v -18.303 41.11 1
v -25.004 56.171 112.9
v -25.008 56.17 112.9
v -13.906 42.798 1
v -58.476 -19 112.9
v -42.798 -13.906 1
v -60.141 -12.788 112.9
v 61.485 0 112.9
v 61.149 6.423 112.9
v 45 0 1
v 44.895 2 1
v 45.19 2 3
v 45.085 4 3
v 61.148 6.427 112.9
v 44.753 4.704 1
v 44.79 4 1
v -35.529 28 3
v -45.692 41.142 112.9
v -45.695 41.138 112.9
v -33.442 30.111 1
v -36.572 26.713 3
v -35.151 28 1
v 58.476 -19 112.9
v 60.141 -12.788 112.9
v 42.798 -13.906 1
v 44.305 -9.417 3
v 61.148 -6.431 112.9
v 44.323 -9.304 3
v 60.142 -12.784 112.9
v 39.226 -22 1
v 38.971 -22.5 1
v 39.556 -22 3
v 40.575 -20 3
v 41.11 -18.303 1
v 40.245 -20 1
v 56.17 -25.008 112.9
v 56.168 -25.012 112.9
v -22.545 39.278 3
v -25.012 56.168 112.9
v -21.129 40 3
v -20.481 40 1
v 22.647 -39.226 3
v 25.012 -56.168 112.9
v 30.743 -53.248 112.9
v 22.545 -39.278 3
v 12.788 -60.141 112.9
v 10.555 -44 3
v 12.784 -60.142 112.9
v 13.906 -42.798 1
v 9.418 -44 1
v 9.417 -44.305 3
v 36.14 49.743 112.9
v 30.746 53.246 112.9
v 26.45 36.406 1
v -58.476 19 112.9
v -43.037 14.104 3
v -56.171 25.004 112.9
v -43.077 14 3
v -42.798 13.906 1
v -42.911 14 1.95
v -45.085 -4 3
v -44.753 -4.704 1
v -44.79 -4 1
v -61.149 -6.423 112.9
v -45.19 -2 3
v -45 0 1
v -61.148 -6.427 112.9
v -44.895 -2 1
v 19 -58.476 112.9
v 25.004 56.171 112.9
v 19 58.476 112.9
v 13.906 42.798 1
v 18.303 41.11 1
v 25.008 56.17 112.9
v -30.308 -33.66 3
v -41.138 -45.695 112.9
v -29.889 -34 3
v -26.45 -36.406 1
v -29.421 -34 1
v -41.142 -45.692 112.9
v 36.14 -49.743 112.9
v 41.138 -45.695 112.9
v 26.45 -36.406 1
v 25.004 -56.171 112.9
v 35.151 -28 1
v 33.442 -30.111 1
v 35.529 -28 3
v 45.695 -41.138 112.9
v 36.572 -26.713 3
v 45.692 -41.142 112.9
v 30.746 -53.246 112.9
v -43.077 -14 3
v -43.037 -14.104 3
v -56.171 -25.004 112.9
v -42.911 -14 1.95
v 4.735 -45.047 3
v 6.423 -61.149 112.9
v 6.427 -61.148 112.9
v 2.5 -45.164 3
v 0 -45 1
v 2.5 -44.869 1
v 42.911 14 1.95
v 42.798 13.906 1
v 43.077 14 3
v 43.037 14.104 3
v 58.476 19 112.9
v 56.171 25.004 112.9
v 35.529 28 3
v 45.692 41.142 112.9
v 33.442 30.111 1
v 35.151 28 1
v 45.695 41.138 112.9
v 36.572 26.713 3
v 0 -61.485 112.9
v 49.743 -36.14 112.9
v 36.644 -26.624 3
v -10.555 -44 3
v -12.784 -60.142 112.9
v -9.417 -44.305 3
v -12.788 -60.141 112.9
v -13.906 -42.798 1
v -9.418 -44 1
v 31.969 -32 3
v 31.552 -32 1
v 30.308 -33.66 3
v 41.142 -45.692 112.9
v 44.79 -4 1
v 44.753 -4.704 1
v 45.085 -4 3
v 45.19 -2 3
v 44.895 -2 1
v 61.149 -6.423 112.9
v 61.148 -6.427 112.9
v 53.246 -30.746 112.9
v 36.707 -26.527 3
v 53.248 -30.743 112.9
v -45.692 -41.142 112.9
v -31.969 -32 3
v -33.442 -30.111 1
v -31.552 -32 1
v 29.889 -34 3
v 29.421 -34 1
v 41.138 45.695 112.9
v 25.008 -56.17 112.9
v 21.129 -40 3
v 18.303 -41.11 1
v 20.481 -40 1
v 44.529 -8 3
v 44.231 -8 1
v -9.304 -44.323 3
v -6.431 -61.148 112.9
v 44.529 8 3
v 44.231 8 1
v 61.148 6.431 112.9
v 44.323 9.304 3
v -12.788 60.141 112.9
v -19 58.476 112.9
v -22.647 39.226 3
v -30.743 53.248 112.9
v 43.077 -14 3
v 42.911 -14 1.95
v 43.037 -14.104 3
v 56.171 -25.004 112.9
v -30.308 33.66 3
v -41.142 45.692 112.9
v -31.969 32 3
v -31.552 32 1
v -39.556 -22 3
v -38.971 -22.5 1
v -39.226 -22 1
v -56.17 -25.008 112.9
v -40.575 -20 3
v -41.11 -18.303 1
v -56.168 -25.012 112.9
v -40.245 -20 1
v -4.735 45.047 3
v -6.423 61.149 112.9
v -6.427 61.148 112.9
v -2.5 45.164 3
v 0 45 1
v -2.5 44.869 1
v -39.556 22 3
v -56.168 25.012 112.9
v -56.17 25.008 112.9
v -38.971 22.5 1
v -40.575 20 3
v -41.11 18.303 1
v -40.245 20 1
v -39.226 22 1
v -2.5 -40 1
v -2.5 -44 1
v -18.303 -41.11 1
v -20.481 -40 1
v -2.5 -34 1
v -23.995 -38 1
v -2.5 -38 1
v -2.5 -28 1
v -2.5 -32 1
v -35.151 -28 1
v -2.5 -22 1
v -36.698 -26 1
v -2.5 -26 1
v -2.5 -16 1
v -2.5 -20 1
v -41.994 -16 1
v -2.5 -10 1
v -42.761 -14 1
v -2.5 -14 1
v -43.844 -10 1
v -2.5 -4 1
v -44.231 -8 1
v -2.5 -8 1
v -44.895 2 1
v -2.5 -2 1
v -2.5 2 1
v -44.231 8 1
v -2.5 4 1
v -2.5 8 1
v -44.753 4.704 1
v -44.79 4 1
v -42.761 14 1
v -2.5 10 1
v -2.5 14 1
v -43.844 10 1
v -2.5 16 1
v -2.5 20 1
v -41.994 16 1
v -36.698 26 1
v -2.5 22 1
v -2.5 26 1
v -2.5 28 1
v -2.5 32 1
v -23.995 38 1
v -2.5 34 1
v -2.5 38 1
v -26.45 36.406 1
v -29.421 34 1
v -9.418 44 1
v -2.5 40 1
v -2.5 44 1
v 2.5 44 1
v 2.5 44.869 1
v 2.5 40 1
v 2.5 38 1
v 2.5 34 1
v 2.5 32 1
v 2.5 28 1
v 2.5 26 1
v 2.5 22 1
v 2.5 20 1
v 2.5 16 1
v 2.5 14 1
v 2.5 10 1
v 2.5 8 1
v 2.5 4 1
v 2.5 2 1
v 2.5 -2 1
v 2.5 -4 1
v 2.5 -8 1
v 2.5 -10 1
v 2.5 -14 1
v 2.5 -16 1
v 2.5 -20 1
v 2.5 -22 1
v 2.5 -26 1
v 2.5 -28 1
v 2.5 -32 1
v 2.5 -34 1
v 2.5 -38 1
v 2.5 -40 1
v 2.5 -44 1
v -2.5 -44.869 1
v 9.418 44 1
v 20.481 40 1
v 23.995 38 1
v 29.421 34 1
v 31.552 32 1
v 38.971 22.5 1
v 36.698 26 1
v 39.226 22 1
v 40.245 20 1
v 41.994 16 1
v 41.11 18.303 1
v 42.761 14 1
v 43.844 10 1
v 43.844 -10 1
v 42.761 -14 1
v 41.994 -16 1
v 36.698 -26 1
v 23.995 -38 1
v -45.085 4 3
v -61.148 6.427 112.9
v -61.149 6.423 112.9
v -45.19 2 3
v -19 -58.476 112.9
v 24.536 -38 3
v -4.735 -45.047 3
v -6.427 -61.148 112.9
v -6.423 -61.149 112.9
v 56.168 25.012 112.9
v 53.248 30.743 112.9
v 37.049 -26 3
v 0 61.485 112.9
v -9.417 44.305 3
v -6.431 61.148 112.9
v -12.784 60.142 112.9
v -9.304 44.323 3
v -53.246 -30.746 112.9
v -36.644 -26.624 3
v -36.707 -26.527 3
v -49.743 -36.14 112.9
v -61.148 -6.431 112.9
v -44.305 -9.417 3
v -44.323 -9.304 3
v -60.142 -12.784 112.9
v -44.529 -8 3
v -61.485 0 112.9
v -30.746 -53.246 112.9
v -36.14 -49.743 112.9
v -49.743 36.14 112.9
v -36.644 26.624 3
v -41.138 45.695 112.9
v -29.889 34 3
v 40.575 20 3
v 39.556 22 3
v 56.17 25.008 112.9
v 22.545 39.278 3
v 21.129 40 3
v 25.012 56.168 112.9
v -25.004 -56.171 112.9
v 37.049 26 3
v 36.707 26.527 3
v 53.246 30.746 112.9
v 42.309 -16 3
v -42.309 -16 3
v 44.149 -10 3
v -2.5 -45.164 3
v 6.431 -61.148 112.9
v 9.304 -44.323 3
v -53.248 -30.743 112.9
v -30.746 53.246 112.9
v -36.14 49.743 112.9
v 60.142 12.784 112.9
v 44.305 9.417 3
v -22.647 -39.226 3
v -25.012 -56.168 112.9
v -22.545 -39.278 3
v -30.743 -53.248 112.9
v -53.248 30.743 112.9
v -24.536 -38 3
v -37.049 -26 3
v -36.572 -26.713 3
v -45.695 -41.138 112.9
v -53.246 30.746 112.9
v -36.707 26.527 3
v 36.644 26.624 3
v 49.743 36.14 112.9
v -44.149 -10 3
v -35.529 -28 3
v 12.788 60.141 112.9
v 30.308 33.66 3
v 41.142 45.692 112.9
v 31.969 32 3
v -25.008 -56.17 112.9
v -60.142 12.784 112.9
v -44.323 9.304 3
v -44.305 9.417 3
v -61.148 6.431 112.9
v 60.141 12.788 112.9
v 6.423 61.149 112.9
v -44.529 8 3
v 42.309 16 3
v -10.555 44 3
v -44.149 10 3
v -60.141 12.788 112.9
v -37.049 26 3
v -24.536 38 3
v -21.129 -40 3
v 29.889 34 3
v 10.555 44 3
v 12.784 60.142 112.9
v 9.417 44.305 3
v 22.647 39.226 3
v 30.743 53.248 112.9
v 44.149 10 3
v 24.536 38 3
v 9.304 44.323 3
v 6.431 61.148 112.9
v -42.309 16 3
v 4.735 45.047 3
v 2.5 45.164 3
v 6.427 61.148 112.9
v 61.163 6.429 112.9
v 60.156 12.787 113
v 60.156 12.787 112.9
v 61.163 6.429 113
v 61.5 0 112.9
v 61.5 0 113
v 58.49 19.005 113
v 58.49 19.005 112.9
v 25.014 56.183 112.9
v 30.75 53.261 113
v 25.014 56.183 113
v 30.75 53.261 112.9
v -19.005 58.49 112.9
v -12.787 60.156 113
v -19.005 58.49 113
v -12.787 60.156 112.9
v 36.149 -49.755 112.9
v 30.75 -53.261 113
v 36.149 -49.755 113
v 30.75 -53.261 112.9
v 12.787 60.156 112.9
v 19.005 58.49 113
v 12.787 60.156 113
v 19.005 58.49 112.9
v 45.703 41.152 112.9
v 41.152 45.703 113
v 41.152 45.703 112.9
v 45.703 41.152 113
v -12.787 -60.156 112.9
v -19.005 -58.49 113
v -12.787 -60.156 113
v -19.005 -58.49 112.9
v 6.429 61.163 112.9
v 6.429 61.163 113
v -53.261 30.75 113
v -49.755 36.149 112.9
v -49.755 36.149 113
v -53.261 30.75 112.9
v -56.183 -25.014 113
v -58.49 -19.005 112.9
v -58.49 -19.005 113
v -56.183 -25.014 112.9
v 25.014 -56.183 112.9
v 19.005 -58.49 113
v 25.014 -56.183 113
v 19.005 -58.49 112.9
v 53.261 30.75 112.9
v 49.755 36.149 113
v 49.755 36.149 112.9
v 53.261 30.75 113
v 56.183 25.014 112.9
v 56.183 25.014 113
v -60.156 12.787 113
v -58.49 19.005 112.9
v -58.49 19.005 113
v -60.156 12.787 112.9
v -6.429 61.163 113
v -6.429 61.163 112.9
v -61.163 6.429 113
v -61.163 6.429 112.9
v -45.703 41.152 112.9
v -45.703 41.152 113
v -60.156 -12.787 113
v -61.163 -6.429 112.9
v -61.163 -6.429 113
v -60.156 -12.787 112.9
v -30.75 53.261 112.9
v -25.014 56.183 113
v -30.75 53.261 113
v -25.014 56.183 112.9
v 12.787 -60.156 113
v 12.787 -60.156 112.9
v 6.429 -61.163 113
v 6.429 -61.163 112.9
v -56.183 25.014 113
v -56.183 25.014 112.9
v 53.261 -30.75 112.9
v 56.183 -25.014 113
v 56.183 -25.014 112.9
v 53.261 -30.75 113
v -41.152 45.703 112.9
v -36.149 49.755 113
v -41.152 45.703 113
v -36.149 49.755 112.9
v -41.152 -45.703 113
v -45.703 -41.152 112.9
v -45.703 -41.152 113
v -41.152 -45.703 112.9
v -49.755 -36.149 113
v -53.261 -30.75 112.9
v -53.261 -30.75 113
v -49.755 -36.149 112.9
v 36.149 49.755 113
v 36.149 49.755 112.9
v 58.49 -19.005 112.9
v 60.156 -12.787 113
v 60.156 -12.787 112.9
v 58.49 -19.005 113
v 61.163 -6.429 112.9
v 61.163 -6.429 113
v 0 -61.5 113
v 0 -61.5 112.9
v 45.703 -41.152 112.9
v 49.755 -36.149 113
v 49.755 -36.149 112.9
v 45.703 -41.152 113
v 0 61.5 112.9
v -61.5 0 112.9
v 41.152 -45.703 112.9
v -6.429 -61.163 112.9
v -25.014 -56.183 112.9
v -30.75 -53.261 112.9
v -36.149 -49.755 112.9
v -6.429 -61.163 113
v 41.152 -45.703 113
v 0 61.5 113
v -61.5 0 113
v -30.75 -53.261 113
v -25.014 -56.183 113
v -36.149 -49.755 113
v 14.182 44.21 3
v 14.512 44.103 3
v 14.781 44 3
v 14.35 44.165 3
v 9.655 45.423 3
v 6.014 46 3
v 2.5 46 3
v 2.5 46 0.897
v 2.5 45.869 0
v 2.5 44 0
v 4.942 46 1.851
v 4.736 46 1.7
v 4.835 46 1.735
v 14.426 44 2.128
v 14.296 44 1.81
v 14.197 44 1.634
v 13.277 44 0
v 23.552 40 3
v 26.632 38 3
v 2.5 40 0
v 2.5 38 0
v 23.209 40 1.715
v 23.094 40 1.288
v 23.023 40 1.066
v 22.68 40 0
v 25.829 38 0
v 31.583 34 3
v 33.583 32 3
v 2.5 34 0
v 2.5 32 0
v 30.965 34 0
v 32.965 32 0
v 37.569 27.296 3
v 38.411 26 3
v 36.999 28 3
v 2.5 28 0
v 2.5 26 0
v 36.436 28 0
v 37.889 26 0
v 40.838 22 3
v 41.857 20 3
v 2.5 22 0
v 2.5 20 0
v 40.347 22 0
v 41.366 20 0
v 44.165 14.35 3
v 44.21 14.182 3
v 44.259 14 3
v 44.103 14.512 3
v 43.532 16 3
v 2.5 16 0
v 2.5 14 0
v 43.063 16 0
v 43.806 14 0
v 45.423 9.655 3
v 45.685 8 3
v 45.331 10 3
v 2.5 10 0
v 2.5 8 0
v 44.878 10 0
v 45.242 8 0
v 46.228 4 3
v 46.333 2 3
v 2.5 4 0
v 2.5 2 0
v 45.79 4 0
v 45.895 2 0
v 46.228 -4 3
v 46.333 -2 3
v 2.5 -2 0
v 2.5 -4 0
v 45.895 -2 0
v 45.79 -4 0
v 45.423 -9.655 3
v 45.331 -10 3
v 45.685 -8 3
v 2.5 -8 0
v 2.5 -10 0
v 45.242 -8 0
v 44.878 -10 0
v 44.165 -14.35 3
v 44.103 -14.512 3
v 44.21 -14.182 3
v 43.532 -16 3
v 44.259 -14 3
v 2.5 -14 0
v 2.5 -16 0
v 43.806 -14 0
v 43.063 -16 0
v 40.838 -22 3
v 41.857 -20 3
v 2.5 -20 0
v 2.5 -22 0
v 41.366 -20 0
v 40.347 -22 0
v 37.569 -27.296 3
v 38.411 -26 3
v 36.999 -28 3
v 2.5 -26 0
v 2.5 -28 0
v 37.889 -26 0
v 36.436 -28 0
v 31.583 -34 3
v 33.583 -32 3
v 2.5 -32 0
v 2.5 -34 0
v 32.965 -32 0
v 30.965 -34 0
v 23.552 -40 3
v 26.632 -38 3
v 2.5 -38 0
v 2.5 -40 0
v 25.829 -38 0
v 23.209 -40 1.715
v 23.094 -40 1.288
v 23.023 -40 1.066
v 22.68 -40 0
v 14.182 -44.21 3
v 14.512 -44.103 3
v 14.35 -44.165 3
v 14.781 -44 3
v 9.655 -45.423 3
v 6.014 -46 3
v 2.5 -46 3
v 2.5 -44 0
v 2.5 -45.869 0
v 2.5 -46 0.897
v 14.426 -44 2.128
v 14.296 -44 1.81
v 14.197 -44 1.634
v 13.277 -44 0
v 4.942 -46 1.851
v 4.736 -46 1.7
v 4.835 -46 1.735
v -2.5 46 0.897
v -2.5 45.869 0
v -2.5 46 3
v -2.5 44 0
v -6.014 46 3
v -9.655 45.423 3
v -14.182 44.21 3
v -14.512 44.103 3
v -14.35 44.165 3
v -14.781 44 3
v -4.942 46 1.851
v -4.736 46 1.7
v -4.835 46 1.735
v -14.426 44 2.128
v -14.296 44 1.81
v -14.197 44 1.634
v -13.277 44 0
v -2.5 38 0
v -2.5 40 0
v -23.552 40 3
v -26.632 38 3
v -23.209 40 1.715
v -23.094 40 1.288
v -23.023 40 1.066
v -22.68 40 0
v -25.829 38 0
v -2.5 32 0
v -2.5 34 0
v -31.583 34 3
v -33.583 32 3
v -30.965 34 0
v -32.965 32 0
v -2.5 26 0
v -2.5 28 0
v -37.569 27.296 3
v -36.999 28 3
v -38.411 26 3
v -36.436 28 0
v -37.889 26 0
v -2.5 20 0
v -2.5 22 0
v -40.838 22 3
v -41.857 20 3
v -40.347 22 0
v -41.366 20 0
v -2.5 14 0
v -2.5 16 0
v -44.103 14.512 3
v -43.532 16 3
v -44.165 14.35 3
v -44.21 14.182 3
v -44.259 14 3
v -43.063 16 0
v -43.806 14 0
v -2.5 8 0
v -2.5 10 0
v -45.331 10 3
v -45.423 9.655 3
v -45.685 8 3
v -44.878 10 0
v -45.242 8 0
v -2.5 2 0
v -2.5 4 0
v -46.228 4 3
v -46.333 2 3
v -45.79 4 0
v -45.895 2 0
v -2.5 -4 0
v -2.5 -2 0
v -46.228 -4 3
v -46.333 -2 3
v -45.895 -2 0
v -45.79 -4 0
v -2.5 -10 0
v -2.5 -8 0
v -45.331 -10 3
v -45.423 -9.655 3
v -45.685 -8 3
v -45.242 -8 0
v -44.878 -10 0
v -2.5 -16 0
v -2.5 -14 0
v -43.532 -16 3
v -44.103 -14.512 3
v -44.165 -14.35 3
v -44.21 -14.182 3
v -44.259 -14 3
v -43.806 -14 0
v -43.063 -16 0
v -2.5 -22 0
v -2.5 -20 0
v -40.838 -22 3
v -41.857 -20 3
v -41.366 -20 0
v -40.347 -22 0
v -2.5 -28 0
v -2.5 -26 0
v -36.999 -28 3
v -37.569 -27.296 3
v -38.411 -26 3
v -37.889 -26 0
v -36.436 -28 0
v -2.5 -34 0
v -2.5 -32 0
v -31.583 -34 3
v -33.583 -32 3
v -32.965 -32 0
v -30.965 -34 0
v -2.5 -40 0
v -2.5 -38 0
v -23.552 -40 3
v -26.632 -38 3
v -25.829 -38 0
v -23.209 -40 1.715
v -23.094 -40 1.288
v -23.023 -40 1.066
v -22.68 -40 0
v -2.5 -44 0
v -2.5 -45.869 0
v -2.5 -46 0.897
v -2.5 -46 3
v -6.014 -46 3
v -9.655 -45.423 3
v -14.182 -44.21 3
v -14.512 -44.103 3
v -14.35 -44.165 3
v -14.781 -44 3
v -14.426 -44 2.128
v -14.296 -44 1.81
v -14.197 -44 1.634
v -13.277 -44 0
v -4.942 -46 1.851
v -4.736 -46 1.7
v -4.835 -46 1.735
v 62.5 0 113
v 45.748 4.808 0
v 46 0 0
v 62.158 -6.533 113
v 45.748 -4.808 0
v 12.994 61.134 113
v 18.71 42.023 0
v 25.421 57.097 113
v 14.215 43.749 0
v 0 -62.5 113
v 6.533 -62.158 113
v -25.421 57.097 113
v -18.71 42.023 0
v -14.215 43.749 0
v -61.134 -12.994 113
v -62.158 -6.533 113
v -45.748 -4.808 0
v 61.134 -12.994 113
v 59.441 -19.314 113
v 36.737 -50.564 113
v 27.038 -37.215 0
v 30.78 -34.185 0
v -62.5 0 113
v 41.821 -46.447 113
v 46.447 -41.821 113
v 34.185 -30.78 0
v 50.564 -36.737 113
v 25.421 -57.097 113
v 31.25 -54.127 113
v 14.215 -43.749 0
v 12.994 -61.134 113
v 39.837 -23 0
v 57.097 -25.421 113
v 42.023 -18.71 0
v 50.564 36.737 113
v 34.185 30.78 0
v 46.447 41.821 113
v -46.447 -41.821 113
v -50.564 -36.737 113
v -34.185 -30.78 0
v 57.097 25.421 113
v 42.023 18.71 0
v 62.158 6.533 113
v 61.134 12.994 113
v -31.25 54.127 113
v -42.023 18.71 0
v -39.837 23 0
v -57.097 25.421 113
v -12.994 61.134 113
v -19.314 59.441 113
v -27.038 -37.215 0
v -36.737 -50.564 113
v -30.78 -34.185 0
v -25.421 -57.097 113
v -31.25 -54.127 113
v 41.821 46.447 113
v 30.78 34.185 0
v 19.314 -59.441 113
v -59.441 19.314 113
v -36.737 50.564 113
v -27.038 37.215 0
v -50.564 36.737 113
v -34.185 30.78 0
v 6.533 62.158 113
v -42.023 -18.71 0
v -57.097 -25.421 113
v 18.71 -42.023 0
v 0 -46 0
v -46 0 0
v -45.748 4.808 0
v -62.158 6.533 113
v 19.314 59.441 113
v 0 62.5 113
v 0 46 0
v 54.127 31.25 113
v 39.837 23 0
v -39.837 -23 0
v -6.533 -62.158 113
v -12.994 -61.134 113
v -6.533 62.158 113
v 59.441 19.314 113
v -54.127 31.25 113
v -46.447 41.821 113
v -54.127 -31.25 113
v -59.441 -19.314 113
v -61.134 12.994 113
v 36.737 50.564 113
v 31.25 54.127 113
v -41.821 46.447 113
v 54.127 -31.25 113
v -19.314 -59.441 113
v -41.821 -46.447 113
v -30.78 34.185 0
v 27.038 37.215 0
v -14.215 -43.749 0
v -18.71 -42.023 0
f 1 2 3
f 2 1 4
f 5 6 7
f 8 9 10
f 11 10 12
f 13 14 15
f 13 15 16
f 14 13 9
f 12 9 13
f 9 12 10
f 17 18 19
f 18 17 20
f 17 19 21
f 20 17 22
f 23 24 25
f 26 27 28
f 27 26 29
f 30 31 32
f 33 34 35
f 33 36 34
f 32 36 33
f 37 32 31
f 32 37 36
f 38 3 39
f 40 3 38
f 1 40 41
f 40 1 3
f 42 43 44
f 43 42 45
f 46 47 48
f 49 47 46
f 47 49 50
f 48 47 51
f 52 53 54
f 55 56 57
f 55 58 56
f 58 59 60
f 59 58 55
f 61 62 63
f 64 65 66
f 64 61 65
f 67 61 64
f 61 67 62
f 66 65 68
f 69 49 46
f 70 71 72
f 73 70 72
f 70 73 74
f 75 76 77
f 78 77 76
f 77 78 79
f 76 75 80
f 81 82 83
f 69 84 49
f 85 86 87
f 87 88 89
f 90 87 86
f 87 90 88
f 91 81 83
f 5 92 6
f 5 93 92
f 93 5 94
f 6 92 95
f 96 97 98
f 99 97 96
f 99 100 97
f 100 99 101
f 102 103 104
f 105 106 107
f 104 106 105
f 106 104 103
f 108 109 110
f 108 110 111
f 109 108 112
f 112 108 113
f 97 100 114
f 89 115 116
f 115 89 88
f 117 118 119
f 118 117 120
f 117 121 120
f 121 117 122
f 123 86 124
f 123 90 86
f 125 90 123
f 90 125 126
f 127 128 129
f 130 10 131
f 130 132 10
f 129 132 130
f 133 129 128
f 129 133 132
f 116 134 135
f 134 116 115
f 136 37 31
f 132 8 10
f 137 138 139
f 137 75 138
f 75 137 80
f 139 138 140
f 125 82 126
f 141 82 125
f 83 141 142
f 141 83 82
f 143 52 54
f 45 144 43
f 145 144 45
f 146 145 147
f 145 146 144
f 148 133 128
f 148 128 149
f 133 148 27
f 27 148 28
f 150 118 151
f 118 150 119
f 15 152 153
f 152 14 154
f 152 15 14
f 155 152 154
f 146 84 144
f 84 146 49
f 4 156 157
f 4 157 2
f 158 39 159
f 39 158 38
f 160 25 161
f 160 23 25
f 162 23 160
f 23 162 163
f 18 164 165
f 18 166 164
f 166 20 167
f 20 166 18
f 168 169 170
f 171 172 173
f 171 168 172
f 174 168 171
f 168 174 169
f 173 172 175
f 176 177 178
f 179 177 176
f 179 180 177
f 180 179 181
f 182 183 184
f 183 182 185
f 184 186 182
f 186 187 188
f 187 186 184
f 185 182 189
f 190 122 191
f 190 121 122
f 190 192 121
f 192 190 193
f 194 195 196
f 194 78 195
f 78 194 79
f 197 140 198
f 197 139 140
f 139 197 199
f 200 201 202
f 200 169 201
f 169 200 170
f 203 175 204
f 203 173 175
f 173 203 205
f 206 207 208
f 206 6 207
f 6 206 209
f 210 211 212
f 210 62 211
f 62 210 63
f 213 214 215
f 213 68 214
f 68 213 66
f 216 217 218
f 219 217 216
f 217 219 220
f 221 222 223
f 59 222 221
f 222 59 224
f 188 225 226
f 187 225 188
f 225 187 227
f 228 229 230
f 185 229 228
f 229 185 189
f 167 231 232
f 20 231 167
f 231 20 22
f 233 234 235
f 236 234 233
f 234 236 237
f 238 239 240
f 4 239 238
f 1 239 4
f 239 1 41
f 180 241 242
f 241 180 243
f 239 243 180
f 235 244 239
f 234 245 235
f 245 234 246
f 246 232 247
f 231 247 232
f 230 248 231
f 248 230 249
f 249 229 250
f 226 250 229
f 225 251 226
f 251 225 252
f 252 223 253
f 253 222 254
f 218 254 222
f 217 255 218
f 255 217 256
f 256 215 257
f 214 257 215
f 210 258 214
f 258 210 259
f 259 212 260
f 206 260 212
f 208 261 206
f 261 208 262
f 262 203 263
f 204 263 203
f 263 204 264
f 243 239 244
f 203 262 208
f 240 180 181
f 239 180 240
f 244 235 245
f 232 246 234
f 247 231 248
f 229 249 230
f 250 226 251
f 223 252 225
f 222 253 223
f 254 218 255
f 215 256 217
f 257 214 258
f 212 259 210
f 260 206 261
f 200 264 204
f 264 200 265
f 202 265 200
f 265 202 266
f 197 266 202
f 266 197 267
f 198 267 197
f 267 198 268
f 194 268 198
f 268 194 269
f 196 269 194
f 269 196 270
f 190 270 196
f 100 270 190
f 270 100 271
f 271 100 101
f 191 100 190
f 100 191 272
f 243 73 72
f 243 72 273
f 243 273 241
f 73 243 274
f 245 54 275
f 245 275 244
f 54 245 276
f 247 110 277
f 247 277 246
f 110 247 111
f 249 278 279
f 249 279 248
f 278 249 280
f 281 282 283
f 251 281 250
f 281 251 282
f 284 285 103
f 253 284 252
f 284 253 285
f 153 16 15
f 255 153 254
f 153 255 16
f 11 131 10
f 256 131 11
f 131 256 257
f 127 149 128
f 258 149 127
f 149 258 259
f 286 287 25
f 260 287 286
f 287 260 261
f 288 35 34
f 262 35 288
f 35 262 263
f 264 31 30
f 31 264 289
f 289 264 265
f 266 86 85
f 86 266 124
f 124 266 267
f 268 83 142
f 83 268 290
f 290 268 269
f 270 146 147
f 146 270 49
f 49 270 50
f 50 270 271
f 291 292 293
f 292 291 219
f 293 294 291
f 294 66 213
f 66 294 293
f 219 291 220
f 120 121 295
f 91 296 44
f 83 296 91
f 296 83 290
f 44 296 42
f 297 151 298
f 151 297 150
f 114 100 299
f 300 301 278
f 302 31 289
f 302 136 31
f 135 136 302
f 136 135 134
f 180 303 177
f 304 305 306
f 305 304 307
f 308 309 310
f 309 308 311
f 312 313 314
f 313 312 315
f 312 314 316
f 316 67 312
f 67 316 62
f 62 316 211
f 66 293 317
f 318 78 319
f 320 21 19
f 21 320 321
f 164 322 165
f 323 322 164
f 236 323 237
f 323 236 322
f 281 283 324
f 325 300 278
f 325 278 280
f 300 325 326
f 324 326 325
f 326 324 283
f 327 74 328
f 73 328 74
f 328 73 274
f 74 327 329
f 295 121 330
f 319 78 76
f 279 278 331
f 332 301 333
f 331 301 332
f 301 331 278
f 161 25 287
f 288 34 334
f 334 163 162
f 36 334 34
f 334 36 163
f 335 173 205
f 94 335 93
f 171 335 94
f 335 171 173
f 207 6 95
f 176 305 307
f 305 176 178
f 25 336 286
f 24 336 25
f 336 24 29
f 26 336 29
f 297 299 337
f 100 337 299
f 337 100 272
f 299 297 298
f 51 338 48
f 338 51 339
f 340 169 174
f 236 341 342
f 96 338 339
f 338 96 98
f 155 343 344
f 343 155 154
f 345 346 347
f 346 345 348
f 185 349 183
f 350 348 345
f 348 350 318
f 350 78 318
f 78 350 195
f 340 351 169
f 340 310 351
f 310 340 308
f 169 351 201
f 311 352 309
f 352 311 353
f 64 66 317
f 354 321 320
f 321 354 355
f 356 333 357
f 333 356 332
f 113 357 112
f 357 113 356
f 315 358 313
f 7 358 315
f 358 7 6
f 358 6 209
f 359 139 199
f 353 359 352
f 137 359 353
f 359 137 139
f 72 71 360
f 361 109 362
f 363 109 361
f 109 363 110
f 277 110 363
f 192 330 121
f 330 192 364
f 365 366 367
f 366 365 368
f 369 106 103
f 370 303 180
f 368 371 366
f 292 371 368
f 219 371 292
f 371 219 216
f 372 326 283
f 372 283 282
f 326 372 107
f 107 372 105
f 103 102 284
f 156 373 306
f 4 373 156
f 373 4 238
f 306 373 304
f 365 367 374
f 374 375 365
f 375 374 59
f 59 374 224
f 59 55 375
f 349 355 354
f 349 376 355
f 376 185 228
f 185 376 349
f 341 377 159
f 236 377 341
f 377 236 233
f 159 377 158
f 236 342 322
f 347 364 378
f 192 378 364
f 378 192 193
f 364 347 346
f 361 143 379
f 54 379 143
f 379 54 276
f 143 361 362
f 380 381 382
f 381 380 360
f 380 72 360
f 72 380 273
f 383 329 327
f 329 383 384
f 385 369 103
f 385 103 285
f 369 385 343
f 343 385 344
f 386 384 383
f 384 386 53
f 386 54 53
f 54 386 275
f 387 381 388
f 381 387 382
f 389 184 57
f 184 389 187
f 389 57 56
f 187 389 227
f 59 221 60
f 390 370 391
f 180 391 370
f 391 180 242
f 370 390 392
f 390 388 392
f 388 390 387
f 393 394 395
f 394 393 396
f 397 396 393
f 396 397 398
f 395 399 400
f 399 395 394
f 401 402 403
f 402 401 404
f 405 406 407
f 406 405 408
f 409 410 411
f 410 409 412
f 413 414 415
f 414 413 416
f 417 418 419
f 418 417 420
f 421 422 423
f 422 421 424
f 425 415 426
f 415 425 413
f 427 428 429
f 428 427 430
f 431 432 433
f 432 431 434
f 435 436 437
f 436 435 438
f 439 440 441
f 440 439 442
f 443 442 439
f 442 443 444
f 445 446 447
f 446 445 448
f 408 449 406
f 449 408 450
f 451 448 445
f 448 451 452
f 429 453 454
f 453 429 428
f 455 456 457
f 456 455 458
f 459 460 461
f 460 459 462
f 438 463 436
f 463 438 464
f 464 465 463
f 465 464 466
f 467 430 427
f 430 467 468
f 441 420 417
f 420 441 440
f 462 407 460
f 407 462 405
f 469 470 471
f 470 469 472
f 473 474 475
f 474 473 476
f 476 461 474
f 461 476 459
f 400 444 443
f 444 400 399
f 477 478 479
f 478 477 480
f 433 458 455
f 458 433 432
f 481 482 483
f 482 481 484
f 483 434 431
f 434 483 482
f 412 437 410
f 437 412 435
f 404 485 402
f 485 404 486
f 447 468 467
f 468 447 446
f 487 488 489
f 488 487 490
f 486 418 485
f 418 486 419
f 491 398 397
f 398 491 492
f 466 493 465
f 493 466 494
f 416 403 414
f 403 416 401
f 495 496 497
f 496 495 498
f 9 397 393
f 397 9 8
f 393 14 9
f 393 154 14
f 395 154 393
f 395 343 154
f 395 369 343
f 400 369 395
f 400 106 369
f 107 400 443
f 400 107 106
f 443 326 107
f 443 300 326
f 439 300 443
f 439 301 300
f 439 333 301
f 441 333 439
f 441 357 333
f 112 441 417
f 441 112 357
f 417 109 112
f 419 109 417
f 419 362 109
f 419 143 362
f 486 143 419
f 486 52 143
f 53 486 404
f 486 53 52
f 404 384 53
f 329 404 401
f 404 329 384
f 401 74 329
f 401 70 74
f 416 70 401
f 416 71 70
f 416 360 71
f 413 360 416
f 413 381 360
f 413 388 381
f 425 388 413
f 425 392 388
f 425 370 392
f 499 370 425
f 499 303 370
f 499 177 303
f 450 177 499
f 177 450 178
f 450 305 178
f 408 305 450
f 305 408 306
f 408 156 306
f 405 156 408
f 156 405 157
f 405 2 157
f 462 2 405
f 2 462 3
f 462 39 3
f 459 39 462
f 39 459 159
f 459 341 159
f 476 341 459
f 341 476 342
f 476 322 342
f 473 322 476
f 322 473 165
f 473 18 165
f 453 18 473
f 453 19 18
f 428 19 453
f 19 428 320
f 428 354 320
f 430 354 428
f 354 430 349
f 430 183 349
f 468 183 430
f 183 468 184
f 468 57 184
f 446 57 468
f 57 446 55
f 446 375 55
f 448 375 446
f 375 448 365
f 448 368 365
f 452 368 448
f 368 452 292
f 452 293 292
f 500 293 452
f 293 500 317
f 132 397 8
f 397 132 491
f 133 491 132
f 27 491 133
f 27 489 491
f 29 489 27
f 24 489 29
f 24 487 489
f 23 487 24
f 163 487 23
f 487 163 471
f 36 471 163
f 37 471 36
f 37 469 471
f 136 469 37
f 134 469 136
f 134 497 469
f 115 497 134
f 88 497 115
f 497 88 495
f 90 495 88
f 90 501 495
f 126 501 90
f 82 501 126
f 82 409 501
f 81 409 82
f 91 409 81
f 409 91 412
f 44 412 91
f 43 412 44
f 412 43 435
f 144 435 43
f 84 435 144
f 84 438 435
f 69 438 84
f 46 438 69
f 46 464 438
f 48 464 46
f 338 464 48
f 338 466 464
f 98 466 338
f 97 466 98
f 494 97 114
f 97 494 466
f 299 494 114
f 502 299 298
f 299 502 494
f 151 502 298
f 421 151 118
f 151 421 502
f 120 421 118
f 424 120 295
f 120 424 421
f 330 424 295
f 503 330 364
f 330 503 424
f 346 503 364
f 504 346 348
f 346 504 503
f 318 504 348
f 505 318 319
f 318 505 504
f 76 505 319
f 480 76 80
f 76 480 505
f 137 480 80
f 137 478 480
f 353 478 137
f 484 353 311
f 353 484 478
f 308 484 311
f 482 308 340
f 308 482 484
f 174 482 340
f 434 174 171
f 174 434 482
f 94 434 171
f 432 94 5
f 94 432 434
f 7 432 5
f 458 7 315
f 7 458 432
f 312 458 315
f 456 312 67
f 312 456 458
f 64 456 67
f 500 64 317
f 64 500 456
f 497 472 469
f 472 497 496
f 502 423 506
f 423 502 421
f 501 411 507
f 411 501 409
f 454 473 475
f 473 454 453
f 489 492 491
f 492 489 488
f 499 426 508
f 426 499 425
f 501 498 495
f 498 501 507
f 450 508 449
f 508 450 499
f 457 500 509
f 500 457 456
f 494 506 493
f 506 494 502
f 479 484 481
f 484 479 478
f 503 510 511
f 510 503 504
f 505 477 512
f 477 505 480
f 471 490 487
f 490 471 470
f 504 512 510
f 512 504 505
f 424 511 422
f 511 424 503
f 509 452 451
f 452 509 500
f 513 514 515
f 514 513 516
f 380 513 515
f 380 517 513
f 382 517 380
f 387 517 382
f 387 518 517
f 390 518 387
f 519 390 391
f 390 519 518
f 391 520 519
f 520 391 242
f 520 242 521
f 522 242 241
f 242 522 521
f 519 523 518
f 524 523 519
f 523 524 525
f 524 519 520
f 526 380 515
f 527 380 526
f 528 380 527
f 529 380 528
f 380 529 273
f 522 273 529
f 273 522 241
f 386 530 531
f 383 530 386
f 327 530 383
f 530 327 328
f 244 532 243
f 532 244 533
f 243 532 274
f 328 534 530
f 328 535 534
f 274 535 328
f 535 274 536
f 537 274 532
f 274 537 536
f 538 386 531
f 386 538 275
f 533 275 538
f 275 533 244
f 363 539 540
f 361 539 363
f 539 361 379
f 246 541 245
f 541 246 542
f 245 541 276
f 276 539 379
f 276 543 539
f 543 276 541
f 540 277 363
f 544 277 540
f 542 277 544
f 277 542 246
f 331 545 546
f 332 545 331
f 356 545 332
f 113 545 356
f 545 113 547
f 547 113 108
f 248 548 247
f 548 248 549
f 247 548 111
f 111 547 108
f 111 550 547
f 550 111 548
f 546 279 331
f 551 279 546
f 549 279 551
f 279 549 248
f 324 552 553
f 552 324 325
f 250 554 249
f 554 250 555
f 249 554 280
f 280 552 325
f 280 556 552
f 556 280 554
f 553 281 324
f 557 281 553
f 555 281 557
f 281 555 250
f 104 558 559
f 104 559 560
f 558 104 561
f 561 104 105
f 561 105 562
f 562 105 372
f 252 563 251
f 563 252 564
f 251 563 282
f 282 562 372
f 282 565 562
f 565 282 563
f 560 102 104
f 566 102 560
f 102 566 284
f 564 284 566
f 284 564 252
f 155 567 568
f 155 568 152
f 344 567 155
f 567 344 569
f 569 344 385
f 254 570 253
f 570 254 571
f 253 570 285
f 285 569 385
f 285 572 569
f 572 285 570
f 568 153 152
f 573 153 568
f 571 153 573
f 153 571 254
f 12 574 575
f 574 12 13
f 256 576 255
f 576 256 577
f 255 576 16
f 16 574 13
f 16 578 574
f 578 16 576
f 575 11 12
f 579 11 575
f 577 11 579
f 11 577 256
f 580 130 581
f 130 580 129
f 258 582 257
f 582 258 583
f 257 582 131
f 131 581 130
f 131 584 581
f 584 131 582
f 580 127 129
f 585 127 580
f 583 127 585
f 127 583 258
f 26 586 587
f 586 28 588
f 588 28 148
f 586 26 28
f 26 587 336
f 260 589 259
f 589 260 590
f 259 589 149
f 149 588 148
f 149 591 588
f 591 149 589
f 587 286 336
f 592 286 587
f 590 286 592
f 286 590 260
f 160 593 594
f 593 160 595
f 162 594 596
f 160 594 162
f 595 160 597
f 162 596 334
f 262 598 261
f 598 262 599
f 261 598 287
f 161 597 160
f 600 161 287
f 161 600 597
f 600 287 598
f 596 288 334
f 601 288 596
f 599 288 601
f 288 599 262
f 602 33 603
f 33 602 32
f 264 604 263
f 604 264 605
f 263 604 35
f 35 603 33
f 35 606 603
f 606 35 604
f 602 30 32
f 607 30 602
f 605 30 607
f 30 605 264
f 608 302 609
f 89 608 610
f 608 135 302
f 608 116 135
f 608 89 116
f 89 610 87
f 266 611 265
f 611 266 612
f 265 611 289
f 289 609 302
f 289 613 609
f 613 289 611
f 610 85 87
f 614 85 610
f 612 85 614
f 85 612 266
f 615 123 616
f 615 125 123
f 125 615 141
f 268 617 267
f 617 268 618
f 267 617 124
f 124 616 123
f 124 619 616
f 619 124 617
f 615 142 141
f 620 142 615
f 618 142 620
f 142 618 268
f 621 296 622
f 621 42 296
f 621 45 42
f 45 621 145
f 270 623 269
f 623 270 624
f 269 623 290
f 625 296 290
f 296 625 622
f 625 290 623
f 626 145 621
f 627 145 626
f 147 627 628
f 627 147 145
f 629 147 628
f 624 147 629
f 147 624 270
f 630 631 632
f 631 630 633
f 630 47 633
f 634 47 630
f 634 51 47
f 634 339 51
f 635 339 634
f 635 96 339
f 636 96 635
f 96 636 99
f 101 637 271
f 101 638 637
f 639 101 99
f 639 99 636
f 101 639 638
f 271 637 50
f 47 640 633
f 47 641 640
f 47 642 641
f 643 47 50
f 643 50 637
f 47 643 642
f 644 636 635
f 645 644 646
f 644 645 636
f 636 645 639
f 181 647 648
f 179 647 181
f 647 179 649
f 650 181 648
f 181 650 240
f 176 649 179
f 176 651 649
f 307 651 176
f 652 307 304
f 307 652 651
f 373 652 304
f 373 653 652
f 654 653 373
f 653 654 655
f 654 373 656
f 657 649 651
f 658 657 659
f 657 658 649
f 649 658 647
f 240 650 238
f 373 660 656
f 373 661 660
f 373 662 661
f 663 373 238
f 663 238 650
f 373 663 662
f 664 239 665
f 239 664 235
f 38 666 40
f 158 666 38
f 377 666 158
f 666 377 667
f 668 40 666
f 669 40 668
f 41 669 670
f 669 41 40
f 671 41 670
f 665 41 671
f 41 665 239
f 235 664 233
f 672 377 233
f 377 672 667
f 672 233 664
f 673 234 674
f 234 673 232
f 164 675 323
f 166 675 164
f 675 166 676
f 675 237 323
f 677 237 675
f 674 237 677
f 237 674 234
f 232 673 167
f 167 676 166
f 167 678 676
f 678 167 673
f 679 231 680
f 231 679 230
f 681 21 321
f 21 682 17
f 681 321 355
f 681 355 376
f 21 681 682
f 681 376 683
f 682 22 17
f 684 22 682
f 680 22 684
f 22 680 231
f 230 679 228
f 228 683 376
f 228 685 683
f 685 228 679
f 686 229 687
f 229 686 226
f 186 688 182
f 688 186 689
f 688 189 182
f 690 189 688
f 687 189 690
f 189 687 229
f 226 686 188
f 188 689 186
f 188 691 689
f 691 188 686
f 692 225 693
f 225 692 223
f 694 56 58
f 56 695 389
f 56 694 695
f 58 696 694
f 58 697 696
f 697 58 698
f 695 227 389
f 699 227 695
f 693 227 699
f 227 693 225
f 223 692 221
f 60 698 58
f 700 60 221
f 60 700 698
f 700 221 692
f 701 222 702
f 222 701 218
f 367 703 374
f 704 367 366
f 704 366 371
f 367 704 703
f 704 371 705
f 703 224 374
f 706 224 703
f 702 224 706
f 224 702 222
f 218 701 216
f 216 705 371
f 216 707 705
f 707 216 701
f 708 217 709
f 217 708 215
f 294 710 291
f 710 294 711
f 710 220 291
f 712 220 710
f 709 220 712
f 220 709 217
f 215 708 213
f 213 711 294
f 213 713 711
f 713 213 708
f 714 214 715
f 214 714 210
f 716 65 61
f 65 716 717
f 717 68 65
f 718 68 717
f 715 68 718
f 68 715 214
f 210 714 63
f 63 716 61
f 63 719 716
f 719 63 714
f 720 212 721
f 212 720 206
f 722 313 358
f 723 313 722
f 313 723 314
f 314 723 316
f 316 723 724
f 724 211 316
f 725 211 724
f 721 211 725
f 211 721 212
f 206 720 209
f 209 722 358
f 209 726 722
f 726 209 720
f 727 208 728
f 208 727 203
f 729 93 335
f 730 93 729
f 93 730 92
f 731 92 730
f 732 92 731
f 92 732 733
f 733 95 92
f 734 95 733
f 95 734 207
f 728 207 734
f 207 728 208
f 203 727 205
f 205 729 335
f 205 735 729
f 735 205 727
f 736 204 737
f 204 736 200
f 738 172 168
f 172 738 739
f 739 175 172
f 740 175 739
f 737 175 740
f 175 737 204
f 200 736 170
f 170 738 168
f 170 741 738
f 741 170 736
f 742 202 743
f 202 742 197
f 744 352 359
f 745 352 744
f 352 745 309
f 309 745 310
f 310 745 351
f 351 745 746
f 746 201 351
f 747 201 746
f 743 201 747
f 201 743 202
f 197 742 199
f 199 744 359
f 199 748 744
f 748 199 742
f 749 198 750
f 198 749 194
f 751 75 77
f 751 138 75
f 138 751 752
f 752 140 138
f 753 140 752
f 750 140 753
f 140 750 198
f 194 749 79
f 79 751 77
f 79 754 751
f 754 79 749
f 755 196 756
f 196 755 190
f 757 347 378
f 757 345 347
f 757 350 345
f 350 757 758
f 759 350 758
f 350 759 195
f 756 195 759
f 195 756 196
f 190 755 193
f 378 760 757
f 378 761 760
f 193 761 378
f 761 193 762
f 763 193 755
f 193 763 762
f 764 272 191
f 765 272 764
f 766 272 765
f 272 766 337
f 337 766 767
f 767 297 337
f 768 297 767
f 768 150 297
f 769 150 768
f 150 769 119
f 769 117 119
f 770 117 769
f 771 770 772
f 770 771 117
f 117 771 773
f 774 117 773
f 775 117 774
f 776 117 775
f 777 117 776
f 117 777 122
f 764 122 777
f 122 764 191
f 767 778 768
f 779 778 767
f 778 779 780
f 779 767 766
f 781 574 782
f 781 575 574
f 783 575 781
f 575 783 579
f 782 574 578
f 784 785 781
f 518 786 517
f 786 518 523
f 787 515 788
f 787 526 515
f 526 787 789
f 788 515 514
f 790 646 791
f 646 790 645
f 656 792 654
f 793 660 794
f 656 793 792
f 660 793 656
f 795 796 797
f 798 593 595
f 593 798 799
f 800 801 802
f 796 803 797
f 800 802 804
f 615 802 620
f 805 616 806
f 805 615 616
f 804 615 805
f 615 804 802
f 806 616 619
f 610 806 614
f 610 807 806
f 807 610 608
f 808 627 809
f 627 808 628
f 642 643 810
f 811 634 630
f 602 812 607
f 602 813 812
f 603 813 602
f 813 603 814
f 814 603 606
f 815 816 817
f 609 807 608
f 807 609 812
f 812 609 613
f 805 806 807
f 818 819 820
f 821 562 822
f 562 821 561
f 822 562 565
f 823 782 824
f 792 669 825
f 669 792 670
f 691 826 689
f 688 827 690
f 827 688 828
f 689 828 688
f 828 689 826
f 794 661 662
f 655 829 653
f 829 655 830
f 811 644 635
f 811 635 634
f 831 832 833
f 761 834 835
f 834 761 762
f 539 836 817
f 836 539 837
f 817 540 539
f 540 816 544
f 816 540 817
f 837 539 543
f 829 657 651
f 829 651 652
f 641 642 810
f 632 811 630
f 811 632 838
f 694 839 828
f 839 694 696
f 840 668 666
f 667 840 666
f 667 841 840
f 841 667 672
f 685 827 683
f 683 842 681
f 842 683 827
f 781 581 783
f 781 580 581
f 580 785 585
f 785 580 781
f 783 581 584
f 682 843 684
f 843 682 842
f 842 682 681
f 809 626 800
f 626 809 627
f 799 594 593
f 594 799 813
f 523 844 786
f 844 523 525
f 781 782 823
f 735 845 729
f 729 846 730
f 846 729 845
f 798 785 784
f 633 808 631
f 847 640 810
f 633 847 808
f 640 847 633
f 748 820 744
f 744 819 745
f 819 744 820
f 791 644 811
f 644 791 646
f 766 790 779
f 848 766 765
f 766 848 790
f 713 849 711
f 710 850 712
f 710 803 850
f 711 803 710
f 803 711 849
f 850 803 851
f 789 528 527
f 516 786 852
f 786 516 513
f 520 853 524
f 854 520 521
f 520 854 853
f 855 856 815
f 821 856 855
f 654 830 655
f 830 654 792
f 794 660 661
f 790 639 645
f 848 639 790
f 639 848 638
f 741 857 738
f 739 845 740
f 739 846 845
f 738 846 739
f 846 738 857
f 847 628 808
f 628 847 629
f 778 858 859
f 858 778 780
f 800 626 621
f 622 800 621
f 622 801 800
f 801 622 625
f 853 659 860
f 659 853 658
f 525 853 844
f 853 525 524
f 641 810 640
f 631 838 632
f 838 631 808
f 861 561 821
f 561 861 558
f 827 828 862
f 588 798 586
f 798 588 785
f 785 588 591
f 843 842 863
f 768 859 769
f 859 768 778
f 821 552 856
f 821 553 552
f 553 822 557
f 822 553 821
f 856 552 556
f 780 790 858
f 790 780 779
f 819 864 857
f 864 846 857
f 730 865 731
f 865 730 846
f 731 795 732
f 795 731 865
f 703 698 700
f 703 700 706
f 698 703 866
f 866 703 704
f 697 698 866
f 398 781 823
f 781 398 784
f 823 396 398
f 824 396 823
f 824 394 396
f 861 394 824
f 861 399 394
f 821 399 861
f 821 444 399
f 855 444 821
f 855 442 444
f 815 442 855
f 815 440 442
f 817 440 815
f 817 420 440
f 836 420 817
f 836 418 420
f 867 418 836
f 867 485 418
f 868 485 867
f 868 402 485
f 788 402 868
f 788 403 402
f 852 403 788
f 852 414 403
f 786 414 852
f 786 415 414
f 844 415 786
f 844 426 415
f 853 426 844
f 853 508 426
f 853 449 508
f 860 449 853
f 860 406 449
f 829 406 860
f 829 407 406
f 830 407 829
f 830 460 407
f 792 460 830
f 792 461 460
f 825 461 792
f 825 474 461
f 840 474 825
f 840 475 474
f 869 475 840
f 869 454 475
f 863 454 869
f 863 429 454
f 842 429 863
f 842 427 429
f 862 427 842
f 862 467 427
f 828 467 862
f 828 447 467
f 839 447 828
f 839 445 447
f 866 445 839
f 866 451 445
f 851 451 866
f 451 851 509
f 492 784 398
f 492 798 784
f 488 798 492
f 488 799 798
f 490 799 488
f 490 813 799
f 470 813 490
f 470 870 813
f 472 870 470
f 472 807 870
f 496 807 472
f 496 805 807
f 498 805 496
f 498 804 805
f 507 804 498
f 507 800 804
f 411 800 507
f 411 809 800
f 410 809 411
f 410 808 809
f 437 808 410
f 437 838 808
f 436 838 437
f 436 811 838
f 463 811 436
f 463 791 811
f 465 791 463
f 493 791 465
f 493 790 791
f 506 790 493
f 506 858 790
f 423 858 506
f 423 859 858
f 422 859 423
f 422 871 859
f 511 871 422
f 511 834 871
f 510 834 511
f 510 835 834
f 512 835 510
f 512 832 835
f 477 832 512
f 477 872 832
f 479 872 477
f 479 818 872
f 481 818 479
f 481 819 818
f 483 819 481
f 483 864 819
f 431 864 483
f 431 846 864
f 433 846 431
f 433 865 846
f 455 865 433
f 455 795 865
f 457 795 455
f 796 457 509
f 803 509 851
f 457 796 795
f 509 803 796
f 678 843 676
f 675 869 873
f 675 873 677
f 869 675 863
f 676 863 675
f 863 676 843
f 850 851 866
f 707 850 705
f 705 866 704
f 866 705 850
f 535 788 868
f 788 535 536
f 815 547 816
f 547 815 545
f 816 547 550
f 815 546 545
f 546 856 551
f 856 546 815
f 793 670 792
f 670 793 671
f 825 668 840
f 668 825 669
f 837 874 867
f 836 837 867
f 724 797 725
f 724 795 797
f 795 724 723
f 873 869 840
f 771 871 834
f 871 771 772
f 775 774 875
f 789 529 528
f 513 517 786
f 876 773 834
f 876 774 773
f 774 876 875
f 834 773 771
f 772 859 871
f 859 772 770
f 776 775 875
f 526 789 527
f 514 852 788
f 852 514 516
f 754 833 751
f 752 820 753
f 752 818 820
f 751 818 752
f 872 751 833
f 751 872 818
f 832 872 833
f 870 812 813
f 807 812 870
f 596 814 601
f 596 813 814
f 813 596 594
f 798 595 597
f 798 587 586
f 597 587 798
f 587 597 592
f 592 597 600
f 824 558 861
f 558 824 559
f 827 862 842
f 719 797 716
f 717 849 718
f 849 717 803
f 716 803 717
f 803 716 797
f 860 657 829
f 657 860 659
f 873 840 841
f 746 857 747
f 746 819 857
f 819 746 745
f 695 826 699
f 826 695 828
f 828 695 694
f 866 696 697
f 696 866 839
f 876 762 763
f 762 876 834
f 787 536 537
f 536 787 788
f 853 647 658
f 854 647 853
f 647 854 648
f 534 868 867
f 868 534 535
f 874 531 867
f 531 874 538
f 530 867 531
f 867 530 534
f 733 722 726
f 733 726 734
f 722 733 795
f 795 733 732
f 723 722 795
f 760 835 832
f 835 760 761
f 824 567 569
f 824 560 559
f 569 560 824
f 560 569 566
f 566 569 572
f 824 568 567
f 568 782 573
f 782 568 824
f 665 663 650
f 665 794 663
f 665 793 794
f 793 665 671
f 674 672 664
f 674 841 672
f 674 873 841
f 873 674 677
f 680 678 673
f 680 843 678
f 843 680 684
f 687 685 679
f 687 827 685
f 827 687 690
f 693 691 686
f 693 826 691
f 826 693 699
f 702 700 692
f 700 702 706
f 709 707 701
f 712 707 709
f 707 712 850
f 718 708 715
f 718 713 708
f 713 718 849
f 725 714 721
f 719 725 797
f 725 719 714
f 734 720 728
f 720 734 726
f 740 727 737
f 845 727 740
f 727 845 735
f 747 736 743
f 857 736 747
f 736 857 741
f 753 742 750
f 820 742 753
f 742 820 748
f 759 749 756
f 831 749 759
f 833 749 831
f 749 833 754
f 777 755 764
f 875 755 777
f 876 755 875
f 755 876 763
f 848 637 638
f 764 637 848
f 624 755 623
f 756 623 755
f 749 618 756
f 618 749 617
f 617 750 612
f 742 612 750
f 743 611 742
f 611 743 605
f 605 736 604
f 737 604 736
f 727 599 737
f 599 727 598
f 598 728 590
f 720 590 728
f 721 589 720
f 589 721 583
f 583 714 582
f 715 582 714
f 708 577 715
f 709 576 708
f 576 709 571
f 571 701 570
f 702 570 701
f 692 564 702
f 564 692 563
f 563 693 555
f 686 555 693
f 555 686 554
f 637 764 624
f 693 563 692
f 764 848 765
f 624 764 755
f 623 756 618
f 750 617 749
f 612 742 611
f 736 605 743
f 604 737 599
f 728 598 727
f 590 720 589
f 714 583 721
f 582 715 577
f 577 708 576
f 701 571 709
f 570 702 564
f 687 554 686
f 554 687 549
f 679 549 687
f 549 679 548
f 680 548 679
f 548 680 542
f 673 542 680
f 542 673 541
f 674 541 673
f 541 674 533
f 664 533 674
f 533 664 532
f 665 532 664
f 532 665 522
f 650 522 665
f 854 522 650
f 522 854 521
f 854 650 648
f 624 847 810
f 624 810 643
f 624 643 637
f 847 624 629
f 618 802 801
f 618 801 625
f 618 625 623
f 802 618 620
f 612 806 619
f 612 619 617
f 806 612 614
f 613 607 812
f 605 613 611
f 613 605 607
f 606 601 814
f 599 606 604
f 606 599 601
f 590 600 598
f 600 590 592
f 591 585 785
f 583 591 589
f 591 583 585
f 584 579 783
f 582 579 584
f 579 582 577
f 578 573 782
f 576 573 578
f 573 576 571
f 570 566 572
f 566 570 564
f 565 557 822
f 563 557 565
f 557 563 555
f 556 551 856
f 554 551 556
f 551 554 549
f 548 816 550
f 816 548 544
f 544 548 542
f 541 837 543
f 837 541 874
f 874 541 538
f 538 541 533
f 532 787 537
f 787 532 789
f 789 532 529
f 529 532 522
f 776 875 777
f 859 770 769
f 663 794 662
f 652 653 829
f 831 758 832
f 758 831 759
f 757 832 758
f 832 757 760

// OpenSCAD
// preview[view:north east, tilt:top]

// Shape
shape = 0; // [1:Square,0:Round]

// Size of bottom
bottom = 92; // [30:1:150]

// Size of top
top = 125; // [30:1:150]

// Height of flower pot
height = 113; // [30:1:150]

// How thick do you want the flower pot?
t = 1; // [1:0.1:5]

// Do you want perforation in the bottom?
holes = 1; // [1:Yes,0:No]

// Do you want a perforated wall?
perforate = 0; // [1:Yes,0:No]

// Do you want a brim?
brim = 0; // [1:Yes,0:No]

// Do you want feet? (NB! Experimental, need support when printing)
feet = 0; // [1:Yes,0:No]

/* [Hidden] */
detail = 10;
sqr2 = sqrt(2);

// Difference will construct a main shape and subtract cut outs
difference() {
  //***********
  // Main Shape
  //***********
    
  union(){    
    // Flower pot cup
    difference() {      
      
      // Flower pot solid
      union(){
          
        // Brim
        if (brim == 1) {
          translate([0,0,height-1]) {
            if (shape == 1) {
                cylinder(d1=top*sqr2+3,d2=top*sqr2+8,h=2,$fn=4);
              //}
            }
        
            if (shape == 0) {
              cylinder(d1=top+3,d2=top+8,h=2,$fn=60);
            }   
          }
        }
        
        // Main shape
        translate([0,0,0]) {
          if (shape == 1) {
            cylinder(d1=bottom*sqr2,d2=top*sqr2,h=height,$fn=4);
              
          if (feet == 1) {
            translate([bottom*sqr2/2-5,0,-5]) {
              cylinder(d1=10,d2=10,h=5,$fn=4);
            }
            
            translate([0,bottom*sqr2/2-5,-5]) {
              cylinder(d1=10,d2=10,h=5,$fn=4);
            }

            translate([-bottom*sqr2/2+5,0,-5]) {
              cylinder(d1=10,d2=10,h=5,$fn=4);
            }

            translate([0,-bottom*sqr2/2+5,-5]) {
              cylinder(d1=10,d2=10,h=5,$fn=4);
            }
            
            translate([0,0,-5]) {
              cylinder(d1=10,d2=10,h=5,$fn=4);
            }
            
            }

          }
          
          if (shape == 0) {
            cylinder(d1=bottom,d2=top,h=height,$fn=60);
              
             if (feet == 1) {
            translate([bottom/2-5,0,-5]) {
              cylinder(d1=10,d2=10,h=5,$fn=40);
            }
            
            translate([0,bottom/2-5,-5]) {
              cylinder(d1=10,d2=10,h=5,$fn=40);
            }

            translate([-bottom/2+5,0,-5]) {
              cylinder(d1=10,d2=10,h=5,$fn=40);
            }

            translate([0,-bottom/2+5,-5]) {
              cylinder(d1=10,d2=10,h=5,$fn=40);
            }
            
            translate([0,0,-5]) {
              cylinder(d1=10,d2=10,h=5,$fn=40);
            }
            
            }
              
          }
        }
        
        
        
      } // End Union
      
      union(){ // Union cut outs
          
      // Flower pot cut out
      translate([0,0,t]) {
        if (shape == 1) {
          cylinder(d1=bottom*sqr2-t*2,d2=top*sqr2-t*2,h=height-t,$fn=4);
          translate([0,0,height-t-0.1]) {
            cylinder(d1=top*sqr2-t*2,d2=top*sqr2-t*2,h=t*2+5,$fn=4);
          }
        }
        
        if (shape == 0) {
          cylinder(d1=bottom-t*2,d2=top-t*2,h=height-t,$fn=60);
          translate([0,0,height-t-0.1]) {
            cylinder(d1=top-t*2,d2=top-t*2,h=t*2+5,$fn=60);
          }
        }
        
      }
      
     //  translate([0,0,height-t]) {
     //    cylinder(d1=top*sqr2-t,d2=top*sqr2-t,h=t*2+5,$fn=4);
     //  }
      
      if (perforate == 1) {
      for (rotation =[0:600/bottom:360]) {
            rotate([0,0,rotation]) {
                translate([bottom/3,0,t+5]) {
                    rotate([0,0,0]) {
                        // Draw blades
                        cube([top,2,height/2-10],false);
                    } // End rotate
                } // End translate       
            } // End rotate
        } // End for spaceW
        
          for (rotation =[0:600/top:360]) {
            rotate([0,0,rotation]) {
                translate([top/3,0,height/2+2.5]) {
                    rotate([0,0,0]) {
                        // Draw blades
                        cube([top,2,height/2-10],false);
                    } // End rotate
                } // End translate       
            } // End rotate
        } // End for spaceW
        }
      
      // Holes in the bottom Part 1
      if (holes == 1) {
          for (spaceW =[-bottom:6:bottom]) {
            translate([2.5,-spaceW,-1]) {
              cube([bottom,2,t+3],false);
            } // End translate
          } // End for spaceW
      
      // Holes in the bottom Part 2
          for (spaceW =[-bottom:6:bottom]) {
            translate([-bottom-2.5,-spaceW,-1]) {
              cube([bottom,2,t+3],false);
            } // End translate
          } // End for spaceW
      } // End if holes
      
      } // End union cut outs
    } // End difference flower pot
  } // End union
} // End difference  
